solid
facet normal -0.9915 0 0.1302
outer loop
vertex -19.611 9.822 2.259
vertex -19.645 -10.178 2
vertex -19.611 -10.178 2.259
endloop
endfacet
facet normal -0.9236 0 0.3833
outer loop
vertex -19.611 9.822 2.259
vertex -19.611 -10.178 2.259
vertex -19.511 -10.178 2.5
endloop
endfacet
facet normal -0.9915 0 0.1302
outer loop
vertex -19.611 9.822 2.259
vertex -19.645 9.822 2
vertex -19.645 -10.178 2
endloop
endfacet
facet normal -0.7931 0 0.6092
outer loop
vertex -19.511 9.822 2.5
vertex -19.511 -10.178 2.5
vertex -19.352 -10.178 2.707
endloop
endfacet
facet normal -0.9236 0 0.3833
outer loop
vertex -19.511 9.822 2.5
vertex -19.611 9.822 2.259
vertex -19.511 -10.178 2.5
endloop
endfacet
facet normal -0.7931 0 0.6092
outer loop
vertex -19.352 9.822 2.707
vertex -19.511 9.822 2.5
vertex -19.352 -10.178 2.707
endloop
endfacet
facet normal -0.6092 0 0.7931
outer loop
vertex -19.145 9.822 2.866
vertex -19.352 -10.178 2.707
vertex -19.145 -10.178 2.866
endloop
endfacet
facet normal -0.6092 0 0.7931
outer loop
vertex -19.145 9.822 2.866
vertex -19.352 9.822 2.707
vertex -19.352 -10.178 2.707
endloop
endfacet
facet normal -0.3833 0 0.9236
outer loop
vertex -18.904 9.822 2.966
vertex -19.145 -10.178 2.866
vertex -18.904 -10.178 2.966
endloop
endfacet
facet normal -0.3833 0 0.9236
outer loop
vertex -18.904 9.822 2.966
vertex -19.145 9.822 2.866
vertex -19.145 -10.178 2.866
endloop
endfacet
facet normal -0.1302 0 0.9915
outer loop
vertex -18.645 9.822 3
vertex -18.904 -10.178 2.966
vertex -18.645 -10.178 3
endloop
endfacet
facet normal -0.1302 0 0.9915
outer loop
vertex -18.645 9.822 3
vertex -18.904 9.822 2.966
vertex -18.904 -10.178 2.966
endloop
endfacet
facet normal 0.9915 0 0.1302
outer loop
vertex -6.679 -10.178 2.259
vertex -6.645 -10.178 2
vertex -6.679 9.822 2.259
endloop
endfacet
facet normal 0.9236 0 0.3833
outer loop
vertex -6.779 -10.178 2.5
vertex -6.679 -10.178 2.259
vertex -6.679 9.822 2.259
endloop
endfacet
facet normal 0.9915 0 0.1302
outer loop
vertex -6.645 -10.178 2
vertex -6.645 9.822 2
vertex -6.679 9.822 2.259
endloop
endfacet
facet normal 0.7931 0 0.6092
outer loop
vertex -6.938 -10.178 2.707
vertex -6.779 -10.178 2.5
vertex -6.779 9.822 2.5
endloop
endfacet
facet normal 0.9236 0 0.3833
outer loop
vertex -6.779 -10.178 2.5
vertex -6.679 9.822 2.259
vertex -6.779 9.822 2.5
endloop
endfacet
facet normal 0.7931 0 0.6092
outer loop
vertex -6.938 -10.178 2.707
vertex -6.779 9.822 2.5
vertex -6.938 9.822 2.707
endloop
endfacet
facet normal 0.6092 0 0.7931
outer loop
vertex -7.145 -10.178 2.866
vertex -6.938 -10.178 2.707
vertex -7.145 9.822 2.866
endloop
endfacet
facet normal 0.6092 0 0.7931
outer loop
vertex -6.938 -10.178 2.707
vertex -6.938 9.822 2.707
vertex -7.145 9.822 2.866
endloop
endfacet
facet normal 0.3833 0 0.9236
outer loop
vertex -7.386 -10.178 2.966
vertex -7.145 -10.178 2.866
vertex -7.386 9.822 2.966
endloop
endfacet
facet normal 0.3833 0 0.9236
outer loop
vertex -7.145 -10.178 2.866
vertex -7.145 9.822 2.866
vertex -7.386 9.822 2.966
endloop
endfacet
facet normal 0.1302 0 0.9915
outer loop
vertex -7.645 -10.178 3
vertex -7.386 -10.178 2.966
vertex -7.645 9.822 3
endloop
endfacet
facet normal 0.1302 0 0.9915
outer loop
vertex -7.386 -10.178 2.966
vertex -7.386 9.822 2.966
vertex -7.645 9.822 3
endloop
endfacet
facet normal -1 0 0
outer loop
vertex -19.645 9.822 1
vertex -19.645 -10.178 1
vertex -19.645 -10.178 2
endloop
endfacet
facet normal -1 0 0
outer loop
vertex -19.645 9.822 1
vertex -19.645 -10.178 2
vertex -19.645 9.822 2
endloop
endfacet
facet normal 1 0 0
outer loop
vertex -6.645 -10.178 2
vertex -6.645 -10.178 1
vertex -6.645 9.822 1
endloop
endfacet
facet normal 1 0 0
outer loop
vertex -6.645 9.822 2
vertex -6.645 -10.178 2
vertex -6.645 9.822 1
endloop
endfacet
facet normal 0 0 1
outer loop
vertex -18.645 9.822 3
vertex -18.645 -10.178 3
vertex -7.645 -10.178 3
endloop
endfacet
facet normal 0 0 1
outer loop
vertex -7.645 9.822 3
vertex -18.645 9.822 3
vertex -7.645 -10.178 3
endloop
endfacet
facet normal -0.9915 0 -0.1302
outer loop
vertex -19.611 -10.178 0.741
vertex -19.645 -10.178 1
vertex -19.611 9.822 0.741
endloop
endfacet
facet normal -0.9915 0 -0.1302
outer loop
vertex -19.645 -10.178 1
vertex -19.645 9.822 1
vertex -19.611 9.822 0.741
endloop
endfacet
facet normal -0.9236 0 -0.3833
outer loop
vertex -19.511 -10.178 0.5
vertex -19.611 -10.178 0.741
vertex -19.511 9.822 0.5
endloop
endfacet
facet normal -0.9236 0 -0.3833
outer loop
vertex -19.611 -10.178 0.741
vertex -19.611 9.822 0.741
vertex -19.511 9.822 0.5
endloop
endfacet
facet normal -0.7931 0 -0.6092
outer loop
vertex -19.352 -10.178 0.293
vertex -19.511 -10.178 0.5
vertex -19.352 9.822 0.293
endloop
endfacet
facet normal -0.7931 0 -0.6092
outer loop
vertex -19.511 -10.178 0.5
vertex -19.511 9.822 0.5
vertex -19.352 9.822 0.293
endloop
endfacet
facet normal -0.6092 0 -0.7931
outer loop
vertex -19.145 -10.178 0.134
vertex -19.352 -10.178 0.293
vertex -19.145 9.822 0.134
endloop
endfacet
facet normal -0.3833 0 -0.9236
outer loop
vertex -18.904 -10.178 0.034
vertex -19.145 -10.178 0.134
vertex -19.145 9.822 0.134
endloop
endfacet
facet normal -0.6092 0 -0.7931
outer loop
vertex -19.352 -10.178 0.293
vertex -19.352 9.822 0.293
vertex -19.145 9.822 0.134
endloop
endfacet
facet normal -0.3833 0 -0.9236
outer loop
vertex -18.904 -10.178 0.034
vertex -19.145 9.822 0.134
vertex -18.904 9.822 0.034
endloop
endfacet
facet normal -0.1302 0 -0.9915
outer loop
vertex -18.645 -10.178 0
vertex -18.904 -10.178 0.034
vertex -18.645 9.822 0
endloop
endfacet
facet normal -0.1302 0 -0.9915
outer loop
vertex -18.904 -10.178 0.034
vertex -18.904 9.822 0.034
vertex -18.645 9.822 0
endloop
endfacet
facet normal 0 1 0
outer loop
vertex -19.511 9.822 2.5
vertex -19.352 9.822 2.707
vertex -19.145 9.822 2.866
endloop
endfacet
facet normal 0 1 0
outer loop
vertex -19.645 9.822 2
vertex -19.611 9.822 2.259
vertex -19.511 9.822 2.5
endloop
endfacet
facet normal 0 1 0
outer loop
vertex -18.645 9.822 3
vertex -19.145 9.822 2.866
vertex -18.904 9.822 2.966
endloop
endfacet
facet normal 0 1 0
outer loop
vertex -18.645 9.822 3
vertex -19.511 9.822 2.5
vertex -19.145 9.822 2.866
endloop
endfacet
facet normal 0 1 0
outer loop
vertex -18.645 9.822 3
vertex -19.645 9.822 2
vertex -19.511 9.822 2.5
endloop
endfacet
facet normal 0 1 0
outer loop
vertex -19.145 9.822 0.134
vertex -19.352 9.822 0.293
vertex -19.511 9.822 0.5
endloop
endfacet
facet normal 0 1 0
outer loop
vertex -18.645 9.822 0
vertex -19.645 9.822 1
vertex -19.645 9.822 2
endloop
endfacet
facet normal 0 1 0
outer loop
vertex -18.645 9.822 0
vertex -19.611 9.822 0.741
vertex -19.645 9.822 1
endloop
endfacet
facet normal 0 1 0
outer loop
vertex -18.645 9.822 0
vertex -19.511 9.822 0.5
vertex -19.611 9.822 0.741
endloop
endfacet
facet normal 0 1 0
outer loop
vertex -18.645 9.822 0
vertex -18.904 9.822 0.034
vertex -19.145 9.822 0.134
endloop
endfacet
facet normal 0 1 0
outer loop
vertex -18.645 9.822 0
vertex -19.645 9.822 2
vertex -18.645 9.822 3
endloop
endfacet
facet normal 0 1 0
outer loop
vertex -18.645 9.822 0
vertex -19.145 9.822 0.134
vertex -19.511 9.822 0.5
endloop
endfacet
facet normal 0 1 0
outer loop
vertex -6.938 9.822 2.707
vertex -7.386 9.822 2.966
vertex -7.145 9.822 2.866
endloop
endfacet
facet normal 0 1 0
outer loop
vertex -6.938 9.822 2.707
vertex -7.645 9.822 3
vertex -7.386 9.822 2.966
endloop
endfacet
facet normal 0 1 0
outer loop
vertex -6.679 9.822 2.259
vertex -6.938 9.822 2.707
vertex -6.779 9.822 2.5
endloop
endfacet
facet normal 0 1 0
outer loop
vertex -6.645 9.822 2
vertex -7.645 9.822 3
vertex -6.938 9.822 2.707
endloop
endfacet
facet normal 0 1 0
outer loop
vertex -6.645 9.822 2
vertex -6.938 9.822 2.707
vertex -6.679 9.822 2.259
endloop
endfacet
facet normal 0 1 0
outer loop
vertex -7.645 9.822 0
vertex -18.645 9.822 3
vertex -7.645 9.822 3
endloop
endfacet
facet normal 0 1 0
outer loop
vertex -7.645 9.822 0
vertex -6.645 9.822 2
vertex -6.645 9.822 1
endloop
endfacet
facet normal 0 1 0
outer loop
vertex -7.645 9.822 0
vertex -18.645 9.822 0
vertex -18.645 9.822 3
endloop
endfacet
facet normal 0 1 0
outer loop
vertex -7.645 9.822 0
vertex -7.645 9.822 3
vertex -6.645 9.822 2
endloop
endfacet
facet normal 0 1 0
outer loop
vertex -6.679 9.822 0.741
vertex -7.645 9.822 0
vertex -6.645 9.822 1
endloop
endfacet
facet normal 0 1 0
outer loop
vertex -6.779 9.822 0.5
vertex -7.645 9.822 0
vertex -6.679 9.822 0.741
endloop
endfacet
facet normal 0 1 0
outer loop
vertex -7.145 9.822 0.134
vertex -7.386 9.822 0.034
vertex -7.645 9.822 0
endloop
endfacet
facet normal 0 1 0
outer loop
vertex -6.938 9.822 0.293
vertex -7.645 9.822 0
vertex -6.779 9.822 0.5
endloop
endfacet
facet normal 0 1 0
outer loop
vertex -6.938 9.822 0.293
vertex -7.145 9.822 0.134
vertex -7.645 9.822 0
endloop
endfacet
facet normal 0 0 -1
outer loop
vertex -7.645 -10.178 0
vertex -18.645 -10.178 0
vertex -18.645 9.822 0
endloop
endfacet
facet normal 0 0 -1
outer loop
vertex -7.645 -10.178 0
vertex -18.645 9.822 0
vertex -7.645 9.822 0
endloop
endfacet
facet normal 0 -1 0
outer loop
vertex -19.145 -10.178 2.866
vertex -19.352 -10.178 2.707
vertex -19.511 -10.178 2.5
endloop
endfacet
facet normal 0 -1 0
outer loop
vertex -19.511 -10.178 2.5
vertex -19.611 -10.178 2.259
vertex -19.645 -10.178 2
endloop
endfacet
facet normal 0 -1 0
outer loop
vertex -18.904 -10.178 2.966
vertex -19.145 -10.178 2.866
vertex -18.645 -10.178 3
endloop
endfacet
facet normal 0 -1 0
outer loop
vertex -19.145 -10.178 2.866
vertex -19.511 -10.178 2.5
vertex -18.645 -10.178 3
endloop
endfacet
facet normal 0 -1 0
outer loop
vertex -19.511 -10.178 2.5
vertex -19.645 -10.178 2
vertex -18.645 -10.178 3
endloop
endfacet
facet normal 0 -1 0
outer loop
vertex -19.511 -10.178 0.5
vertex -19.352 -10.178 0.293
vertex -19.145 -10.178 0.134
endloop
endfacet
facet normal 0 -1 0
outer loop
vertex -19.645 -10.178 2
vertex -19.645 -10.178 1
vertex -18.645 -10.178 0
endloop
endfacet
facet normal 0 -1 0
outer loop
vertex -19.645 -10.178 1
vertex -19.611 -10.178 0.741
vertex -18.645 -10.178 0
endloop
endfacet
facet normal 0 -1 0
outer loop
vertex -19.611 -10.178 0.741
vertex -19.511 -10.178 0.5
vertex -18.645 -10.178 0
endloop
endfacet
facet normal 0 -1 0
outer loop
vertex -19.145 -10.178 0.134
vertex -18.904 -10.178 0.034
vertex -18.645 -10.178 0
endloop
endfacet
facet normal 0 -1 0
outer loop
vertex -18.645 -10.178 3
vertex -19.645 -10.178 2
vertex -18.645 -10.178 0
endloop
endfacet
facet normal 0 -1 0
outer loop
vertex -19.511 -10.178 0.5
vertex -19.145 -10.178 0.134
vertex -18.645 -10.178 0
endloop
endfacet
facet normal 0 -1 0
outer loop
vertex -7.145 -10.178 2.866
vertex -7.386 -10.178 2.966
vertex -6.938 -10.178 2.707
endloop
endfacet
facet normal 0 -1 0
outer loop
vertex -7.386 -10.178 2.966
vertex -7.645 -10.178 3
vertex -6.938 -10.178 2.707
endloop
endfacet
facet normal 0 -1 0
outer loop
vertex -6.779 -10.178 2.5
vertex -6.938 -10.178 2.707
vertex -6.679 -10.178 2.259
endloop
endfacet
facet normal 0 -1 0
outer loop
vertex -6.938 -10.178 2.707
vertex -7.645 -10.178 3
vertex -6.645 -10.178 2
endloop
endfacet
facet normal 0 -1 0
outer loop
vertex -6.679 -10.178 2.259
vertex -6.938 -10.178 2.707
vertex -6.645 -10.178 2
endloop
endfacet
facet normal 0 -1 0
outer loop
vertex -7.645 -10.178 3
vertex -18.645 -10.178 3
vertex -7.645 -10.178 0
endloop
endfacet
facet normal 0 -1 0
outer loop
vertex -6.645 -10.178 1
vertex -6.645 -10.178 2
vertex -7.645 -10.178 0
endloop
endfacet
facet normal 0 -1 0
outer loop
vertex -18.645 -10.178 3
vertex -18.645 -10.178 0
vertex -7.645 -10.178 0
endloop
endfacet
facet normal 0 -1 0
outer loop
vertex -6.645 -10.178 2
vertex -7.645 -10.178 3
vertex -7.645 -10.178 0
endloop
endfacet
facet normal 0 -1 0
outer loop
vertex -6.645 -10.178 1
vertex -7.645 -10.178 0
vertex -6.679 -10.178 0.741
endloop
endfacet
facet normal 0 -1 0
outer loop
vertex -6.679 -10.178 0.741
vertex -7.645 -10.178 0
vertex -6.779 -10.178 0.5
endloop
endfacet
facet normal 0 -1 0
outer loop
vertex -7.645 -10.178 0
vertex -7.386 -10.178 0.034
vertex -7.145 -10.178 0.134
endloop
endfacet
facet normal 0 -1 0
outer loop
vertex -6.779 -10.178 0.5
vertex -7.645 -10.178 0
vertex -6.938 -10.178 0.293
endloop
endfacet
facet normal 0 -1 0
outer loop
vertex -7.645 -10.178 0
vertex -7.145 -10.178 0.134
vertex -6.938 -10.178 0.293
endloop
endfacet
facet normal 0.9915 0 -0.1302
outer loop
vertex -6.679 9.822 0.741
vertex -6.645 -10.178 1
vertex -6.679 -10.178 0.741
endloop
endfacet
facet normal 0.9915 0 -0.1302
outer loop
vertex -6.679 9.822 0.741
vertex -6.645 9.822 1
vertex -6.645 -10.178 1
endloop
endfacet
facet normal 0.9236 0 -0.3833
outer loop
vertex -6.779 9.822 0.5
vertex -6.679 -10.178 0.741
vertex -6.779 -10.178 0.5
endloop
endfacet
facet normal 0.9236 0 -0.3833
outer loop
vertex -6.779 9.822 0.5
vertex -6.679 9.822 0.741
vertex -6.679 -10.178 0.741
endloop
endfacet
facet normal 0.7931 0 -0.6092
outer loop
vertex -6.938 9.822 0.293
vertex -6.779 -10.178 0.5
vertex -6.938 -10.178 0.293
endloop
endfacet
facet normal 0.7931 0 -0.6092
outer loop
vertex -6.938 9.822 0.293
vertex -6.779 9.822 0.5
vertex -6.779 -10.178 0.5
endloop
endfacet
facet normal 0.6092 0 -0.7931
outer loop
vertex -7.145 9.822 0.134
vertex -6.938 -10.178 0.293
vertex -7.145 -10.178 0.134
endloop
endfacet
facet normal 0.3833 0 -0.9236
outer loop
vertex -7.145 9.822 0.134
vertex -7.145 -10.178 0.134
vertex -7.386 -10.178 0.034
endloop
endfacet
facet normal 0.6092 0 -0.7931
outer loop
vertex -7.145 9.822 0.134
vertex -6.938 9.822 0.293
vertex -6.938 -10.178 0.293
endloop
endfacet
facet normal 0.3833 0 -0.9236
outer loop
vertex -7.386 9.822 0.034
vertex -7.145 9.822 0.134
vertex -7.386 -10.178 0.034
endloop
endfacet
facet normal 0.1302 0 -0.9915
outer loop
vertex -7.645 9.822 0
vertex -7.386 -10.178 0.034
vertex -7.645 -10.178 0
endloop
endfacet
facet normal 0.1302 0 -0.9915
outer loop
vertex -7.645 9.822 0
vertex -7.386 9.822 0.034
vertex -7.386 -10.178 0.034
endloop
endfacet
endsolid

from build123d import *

# Parameters (mm, degrees)
CROQUIS1_W              = 13
CROQUIS1_H              = 20
SALIENTE_EXTRUIR1_DEPTH = 3
REDONDEO1_R             = 1


with BuildPart() as part:
    # Croquis1 → Saliente-Extruir1 (new body)
    with BuildSketch(Plane.XY):
        with Locations((-13.144970414, -0.177514793)):
            Rectangle(CROQUIS1_W, CROQUIS1_H)
    extrude(amount=SALIENTE_EXTRUIR1_DEPTH)

    # Redondeo1
    redondeo1_edges = [part.edges().sort_by_distance(p)[0] for p in [
        (-6.644970414, -0.177514793, 3),
        (-19.644970414, -0.177514793, 3),
        (-6.644970414, -0.177514793, 0),
        (-19.644970414, -0.177514793, 0),
    ]]
    fillet(redondeo1_edges, radius=REDONDEO1_R)


solid = part.part
